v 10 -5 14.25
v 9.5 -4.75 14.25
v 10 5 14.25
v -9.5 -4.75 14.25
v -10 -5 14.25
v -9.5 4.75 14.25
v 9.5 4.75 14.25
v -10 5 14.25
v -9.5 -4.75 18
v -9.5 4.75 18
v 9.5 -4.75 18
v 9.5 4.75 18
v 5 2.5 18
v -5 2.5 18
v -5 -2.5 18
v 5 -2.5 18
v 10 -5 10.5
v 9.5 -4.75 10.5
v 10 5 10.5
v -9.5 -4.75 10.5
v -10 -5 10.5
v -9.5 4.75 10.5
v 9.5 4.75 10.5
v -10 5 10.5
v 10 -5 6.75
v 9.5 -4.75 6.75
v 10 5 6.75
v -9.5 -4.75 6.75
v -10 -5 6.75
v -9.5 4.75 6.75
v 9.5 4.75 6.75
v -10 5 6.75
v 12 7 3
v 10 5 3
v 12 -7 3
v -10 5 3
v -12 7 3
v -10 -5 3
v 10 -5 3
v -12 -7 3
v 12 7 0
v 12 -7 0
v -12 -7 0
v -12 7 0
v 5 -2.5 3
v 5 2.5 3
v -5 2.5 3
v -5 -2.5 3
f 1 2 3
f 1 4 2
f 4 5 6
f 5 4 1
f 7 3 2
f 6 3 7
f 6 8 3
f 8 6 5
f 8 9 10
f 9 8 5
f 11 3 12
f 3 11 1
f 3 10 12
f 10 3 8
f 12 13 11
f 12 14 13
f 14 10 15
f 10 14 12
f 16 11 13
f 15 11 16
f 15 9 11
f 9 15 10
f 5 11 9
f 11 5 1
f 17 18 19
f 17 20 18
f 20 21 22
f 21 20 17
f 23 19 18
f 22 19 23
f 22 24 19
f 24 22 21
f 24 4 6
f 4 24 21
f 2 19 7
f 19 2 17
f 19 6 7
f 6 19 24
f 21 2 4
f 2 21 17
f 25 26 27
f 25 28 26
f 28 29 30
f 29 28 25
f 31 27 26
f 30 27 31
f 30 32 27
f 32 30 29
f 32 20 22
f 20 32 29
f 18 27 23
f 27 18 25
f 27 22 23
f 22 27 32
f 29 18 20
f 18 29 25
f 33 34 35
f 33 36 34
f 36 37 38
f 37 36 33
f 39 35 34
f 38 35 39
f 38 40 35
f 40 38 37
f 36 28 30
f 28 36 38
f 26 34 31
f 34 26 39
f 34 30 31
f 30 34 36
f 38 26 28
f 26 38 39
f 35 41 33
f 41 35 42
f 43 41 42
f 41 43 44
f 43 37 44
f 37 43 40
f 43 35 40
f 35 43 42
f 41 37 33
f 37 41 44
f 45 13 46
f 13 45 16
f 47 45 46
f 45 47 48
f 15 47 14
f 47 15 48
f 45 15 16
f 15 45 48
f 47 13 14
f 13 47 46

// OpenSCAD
/*[EndCap generator]*/

// Length of the inner insertion:
InnerLength = 15;
// Max X inner diameter for the rings:
InnerX = 20;
// Max Y inner diameter for the rings:
InnerY = 10;
// Ratio for the smaller ring dimensions (1 or less, 0.94 typical.):
RatioRingsInner=0.95;
// Number of rings:
Rings=4;
// Rings Ratio (1 or less, 0.98 typical.):
RingsRatio=1;
// CAP outer X:
CAPOuterX=24;
// CAP outer Y:
CAPOuterY=14;
// CAP height:
CAPHeight=3;
// Inner hole X dimension:
InnerHoleX=10;
// Inner hole Y dimension:
InnerHoleY=5;
// Inner hole height:
InnerHoleHeight=15;

module MakeRCap()
{
    translate([0,0,InnerLength+CAPHeight])
    rotate([180,0,0])
    difference()
    {
        union()
        {
            // Rings
            for(i=[0:Rings-1])
            {
                Ratio=1-((1-RingsRatio)*(Rings-i));
                RingHeight=InnerLength/Rings;
                translate([0,0,(i+1)*RingHeight])
                rotate([180,0,0])
                linear_extrude(height = RingHeight, scale=RatioRingsInner)
                    square([Ratio*InnerX,Ratio*InnerY],center=true);
            }
            // Cap
            translate([0,0,InnerLength+CAPHeight/2]) cube([CAPOuterX,CAPOuterY,CAPHeight],center=true);
        }
    // Hole
    translate([-InnerHoleX/2,-InnerHoleY/2,0]) cube([InnerHoleX,InnerHoleY, InnerHoleHeight]);
    }
}

// Main
MakeRCap();
